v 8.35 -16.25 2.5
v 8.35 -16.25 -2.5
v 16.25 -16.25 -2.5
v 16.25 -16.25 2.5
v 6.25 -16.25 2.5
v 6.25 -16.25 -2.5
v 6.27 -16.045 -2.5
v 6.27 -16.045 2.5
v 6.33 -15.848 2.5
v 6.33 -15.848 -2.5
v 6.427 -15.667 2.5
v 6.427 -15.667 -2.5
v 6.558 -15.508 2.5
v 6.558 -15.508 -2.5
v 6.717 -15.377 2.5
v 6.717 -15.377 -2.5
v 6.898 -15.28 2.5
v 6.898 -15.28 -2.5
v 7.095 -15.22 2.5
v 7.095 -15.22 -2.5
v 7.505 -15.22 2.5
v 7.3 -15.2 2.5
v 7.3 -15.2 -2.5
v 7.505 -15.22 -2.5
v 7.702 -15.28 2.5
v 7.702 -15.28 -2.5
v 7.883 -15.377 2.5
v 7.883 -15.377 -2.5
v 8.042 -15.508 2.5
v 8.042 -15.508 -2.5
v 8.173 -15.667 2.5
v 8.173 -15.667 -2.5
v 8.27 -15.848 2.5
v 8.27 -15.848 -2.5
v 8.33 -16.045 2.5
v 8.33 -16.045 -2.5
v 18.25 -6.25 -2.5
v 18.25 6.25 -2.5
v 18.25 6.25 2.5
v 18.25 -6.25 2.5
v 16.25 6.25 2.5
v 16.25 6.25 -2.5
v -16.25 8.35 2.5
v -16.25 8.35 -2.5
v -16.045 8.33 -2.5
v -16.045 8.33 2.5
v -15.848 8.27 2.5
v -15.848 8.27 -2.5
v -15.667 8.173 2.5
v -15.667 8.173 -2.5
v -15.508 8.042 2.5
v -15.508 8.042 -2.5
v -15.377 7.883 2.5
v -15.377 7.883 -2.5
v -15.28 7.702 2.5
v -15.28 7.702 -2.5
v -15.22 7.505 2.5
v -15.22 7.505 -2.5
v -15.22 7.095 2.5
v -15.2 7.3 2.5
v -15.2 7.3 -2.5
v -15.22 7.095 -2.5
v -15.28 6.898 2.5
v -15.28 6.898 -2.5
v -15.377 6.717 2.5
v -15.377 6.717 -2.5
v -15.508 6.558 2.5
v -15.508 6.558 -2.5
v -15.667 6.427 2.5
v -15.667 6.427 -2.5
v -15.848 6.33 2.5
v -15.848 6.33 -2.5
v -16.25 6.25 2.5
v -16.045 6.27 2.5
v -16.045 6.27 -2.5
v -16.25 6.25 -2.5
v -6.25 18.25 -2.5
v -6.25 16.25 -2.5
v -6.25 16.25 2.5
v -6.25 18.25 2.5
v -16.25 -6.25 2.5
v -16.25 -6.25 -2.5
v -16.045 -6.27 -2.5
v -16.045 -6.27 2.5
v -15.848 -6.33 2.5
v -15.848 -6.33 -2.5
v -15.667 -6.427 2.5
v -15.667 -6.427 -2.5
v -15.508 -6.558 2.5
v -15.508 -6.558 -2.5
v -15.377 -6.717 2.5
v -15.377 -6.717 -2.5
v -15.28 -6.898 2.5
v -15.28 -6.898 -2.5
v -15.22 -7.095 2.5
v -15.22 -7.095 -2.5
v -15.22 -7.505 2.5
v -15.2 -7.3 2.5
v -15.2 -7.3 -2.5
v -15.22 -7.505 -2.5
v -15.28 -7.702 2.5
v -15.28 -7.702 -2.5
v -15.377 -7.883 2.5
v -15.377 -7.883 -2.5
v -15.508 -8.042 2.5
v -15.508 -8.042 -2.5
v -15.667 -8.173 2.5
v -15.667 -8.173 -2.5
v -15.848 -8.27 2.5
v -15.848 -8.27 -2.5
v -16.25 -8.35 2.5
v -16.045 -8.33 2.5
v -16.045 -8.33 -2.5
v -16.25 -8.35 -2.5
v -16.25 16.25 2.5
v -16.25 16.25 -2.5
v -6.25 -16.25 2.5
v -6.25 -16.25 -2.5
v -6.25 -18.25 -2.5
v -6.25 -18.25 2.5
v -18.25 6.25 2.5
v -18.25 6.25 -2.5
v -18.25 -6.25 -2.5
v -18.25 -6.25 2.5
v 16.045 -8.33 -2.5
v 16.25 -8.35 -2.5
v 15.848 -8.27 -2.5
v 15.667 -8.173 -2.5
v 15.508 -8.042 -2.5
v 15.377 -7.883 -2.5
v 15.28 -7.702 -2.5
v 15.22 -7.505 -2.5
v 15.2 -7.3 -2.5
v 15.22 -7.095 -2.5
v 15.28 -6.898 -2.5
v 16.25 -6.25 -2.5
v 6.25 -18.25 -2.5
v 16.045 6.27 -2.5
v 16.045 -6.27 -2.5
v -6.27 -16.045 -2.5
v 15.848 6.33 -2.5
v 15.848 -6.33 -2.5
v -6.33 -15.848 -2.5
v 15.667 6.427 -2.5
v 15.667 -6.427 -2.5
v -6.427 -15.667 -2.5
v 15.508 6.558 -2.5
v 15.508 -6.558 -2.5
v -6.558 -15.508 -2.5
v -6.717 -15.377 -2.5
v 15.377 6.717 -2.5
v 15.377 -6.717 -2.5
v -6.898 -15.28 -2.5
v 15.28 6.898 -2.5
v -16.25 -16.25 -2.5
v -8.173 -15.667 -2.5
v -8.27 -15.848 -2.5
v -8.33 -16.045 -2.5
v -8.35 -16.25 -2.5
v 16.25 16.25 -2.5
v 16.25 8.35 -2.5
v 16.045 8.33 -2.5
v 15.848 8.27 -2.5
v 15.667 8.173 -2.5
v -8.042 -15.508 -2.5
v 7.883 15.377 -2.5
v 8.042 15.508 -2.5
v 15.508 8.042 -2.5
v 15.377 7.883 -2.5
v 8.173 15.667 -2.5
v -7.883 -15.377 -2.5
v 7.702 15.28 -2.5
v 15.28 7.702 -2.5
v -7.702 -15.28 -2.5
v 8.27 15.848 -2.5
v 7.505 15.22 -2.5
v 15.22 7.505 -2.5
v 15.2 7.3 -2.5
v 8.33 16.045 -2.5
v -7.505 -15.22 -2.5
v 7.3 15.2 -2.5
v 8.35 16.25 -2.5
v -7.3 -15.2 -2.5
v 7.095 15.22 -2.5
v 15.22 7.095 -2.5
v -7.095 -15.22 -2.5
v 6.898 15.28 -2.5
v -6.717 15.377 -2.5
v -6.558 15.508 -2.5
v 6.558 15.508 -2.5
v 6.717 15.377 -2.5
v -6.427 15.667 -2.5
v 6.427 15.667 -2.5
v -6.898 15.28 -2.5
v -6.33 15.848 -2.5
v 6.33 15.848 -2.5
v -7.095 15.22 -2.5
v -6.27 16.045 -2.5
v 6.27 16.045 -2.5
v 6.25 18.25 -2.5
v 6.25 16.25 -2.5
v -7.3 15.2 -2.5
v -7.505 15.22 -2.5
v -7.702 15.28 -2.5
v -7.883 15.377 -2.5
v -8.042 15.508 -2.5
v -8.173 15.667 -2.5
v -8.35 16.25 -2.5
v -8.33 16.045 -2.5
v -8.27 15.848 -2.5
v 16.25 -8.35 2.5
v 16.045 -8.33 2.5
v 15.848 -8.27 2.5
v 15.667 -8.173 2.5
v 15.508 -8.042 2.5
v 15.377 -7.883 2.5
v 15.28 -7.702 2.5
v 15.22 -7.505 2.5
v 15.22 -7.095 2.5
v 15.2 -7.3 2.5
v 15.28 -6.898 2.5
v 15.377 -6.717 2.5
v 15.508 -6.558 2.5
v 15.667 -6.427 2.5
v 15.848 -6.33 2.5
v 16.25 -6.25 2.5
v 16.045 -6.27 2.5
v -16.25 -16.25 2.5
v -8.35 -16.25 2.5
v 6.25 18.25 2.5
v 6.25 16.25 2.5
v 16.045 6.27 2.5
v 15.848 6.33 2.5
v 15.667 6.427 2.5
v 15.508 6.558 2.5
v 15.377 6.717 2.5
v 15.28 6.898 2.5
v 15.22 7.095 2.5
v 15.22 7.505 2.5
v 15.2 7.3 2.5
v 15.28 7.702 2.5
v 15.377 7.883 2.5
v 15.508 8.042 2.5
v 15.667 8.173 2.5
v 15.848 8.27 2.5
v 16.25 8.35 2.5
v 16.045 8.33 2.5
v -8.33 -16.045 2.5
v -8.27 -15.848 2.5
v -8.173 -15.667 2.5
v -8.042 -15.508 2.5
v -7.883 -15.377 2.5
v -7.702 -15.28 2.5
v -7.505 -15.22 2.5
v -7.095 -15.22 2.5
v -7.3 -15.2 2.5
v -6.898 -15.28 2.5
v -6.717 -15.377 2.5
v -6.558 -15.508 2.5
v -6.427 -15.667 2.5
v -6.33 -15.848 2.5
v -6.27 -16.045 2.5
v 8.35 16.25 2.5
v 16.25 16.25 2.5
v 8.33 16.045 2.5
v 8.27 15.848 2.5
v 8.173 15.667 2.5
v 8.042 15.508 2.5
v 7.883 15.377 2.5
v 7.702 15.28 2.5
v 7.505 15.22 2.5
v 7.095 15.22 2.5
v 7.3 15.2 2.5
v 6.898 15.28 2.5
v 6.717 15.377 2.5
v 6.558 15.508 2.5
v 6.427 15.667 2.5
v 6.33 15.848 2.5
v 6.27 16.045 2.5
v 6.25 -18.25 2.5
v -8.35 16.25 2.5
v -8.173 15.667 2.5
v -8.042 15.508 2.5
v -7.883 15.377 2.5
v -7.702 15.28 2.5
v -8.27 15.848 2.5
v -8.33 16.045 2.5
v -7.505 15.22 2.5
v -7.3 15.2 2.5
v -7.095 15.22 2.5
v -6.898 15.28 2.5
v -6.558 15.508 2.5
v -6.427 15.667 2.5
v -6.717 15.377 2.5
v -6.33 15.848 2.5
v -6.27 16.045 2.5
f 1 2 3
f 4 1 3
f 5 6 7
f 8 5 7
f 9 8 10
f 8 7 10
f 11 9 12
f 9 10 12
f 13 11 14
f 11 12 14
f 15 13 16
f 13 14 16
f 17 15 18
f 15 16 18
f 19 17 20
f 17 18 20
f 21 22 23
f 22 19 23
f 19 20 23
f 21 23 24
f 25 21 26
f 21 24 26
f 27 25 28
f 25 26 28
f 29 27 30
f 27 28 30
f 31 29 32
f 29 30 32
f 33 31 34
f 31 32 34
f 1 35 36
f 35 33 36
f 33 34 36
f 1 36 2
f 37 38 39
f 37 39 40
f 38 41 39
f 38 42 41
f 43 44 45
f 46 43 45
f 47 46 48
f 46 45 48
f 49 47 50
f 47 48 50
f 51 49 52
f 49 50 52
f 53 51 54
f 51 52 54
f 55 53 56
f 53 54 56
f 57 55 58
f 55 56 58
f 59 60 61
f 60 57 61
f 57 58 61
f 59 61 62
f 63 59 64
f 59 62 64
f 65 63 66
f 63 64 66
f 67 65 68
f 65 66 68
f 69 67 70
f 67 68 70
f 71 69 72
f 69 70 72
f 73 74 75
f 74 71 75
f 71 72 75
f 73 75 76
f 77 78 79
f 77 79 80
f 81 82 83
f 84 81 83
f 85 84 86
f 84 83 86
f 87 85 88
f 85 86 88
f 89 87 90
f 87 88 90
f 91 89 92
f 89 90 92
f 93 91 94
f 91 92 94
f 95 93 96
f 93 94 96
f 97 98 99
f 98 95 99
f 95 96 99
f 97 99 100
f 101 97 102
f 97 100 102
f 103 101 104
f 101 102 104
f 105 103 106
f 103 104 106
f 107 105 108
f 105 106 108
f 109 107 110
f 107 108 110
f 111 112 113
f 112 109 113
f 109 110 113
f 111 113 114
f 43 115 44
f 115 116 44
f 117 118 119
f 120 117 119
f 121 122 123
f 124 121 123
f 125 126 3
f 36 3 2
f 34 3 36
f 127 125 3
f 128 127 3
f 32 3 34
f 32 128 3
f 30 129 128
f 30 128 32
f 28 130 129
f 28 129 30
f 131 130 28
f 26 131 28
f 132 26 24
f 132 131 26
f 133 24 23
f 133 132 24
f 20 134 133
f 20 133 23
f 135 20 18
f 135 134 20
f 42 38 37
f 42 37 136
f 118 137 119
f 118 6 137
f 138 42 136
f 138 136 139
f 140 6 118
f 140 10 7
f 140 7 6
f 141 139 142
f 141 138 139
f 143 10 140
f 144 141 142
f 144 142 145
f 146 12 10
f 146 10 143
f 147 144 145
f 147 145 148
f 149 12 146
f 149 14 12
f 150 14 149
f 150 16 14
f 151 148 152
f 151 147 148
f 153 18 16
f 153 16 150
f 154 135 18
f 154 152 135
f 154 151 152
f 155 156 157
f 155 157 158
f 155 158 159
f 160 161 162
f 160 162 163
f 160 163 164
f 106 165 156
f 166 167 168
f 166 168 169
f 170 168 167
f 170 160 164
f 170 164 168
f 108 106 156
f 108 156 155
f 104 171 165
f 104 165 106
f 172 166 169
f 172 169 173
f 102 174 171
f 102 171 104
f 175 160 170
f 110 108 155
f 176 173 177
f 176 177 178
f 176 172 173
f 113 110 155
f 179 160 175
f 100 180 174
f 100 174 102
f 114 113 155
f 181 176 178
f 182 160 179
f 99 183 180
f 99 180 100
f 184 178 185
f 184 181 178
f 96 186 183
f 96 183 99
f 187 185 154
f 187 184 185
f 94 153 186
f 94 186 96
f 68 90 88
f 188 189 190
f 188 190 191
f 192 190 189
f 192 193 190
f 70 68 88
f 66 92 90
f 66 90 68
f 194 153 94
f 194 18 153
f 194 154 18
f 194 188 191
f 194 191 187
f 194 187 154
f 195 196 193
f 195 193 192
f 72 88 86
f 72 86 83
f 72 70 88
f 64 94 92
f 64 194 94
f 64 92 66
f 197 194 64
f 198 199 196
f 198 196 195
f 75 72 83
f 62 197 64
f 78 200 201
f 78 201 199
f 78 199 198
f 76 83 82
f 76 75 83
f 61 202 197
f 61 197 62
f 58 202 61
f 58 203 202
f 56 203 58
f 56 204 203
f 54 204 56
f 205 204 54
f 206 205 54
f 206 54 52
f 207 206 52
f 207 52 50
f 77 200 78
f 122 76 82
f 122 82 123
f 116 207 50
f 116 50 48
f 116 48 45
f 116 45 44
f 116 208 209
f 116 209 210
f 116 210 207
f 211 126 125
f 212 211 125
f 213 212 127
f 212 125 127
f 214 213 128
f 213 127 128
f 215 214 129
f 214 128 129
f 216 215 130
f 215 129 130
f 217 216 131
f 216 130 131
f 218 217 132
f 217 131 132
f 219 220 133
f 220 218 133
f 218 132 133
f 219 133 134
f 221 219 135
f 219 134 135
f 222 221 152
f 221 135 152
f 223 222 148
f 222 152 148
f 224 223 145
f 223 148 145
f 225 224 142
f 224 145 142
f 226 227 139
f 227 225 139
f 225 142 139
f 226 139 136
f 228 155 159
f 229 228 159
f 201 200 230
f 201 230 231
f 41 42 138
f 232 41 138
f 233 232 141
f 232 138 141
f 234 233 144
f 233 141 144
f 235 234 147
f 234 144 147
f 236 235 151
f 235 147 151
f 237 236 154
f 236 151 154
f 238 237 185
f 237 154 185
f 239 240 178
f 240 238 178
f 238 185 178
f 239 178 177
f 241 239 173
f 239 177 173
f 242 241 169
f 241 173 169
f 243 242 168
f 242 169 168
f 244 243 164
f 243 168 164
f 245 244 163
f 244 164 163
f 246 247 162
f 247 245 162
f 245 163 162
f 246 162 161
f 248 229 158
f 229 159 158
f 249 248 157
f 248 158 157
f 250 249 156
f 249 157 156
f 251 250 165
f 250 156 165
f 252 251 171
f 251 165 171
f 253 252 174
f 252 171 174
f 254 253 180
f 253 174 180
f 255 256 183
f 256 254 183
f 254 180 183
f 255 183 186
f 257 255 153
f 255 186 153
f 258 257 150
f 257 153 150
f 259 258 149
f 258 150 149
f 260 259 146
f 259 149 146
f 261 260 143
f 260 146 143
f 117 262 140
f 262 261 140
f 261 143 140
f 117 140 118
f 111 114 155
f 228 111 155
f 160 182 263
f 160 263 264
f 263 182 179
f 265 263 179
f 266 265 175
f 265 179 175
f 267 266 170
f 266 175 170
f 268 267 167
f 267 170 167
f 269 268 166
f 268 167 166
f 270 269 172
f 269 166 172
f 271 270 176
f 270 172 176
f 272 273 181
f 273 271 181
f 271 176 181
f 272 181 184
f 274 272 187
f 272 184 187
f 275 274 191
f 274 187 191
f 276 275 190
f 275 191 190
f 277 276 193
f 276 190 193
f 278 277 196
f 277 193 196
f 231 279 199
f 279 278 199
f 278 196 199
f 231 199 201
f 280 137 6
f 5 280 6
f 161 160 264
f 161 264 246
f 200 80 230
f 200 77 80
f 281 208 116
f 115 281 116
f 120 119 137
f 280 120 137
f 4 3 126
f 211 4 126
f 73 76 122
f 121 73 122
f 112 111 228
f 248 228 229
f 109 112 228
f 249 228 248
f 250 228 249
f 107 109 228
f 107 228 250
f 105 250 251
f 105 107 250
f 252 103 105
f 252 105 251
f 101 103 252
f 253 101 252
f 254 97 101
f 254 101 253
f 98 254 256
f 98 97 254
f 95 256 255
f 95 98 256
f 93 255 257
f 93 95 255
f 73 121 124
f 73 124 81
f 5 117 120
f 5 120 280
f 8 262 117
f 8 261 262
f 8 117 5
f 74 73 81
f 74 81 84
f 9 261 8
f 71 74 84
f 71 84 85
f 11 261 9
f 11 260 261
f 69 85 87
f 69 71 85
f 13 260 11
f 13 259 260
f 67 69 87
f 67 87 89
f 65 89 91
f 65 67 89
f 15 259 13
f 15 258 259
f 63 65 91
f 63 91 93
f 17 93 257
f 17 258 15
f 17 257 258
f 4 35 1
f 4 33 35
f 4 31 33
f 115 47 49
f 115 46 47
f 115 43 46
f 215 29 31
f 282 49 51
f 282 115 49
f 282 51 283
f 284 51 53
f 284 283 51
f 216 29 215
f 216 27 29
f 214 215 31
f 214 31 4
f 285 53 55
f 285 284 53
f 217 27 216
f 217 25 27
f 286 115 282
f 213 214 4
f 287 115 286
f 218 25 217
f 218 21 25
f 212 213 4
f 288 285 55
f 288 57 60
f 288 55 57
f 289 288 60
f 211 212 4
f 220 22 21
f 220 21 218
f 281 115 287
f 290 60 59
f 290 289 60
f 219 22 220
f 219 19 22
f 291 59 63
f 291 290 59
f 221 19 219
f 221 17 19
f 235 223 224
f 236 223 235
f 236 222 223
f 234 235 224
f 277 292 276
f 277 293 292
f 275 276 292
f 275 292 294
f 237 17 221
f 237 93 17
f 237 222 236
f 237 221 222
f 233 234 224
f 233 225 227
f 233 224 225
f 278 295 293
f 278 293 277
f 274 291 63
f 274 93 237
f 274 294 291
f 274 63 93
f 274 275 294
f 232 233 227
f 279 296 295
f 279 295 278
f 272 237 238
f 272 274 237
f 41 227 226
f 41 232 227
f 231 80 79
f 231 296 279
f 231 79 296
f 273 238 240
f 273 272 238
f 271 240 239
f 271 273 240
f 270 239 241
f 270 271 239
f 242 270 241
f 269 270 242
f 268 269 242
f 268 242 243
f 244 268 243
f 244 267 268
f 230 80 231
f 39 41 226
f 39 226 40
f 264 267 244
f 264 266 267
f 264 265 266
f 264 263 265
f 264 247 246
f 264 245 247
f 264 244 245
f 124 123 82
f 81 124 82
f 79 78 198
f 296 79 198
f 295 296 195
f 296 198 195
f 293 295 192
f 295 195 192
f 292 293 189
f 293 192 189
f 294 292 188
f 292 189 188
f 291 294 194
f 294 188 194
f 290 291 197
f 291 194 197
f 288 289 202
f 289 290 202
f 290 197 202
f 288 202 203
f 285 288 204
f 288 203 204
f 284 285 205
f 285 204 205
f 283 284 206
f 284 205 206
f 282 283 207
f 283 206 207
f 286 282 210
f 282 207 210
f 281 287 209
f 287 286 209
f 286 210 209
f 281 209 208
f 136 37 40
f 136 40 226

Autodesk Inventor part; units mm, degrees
ref_plane "YZ Plane" through (0, 0, 0) normal (1, 0, 0) x (0, 1, 0)
ref_plane "XZ Plane" through (0, 0, 0) normal (0, 1, 0) x (-1, 0, 0)
ref_plane "XY Plane" through (0, 0, 0) normal (0, 0, 1) x (1, 0, 0)
sketch "スケッチ1" plane through (0, 0, 0) normal (0, 0, 1) x (1, 0, 0)
  line L0 (-16.25, -16.25) -> (16.25, -16.25) construction
  line L1 (16.25, -16.25) -> (16.25, 16.25) construction
  line L2 (16.25, 16.25) -> (-16.25, 16.25) construction
  line L3 (-16.25, 16.25) -> (-16.25, -16.25) construction
  line L4 (-16.25, -16.25) -> (16.25, 16.25) construction
  line L5 (16.25, -16.25) -> (-16.25, 16.25) construction
  line L6 (-8.35, 16.25) -> (-16.25, 16.25)
  line L7 (-16.25, 16.25) -> (-16.25, 8.35)
  line L8 (8.35, 16.25) -> (16.25, 16.25)
  line L9 (16.25, 16.25) -> (16.25, 8.35)
  line L10 (-16.25, -8.35) -> (-16.25, -16.25)
  line L11 (-16.25, -16.25) -> (-8.35, -16.25)
  line L12 (8.35, -16.25) -> (16.25, -16.25)
  line L13 (16.25, -16.25) -> (16.25, -8.35)
  line L14 (-6.25, 16.25) -> (-6.25, 18.25)
  line L15 (-6.25, 18.25) -> (6.25, 18.25)
  line L16 (6.25, 18.25) -> (6.25, 16.25)
  arc A0 (-8.35, 16.25) -> (-6.25, 16.25) centre (-7.3, 16.25) ccw
  arc A1 (6.25, 16.25) -> (8.35, 16.25) centre (7.3, 16.25) ccw
  line L17 (0, 16.25) -> (0, 0) construction
  line L18 (0, 0) -> (16.25, 0) construction
  line L19 (-16.25, 6.25) -> (-18.25, 6.25)
  line L20 (-18.25, 6.25) -> (-18.25, -6.25)
  line L21 (-18.25, -6.25) -> (-16.25, -6.25)
  arc A2 (-16.25, 6.25) -> (-16.25, 8.35) centre (-16.25, 7.3) ccw
  arc A3 (-16.25, -8.35) -> (-16.25, -6.25) centre (-16.25, -7.3) ccw
  line L22 (-6.25, -16.25) -> (-6.25, -18.25)
  line L23 (-6.25, -18.25) -> (6.25, -18.25)
  line L24 (6.25, -18.25) -> (6.25, -16.25)
  arc A4 (-6.25, -16.25) -> (-8.35, -16.25) centre (-7.3, -16.25) ccw
  arc A5 (8.35, -16.25) -> (6.25, -16.25) centre (7.3, -16.25) ccw
  line L25 (16.25, 6.25) -> (18.25, 6.25)
  line L26 (18.25, 6.25) -> (18.25, -6.25)
  line L27 (18.25, -6.25) -> (16.25, -6.25)
  arc A6 (16.25, 8.35) -> (16.25, 6.25) centre (16.25, 7.3) ccw
  arc A7 (16.25, -6.25) -> (16.25, -8.35) centre (16.25, -7.3) ccw
  line L28 (-12.8, 16.25) -> (-9.7, 16.25) construction
  line L29 (-9.7, 16.25) -> (-9.7, 13.25) construction
  line L30 (-9.7, 13.25) -> (-12.8, 13.25) construction
  line L31 (-12.8, 13.25) -> (-12.8, 16.25) construction
  line L32 (-16.25, 12.8) -> (-13.25, 12.8) construction
  line L33 (-13.25, 12.8) -> (-13.25, 9.7) construction
  line L34 (-13.25, 9.7) -> (-16.25, 9.7) construction
  line L35 (-16.25, 9.7) -> (-16.25, 12.8) construction
  line L36 (-10.1287, 12.25) -> (10.1287, 12.25)
  line L37 (10.1287, 12.25) -> (0, 2.1213)
  line L38 (0, 2.1213) -> (-10.1287, 12.25)
  line L39 (-12.25, 10.1287) -> (-12.25, -10.1287)
  line L40 (-12.25, -10.1287) -> (-2.1213, 0)
  line L41 (-2.1213, 0) -> (-12.25, 10.1287)
  line L42 (-10.1287, -12.25) -> (10.1287, -12.25)
  line L43 (10.1287, -12.25) -> (0, -2.1213)
  line L44 (0, -2.1213) -> (-10.1287, -12.25)
  line L45 (12.25, 10.1287) -> (12.25, -10.1287)
  line L46 (12.25, -10.1287) -> (2.1213, 0)
  line L47 (2.1213, 0) -> (12.25, 10.1287)
  line L48 (-11.25, 16.25) -> (-11.25, 13.25) construction
  line L49 (-13.25, 11.25) -> (-16.25, 11.25) construction
  dimension "d0" = 32.5
  dimension "d1" = 1.05
  dimension "d2" = 2
  dimension "d3" = 10
  dimension "d4" = 3.1
  dimension "d6" = 3
  dimension "d8" = 3
  dimension "d9" = 3
  dimension "d10" = 3
  dimension "d11" = 3
  dimension "d12" = 3
  dimension "d13" = 4
  dimension "d17" = 5
  dimension "d18" = 5
extrude "押し出し1" add sketch "スケッチ1" along normal blind 2.5 contours A0 L14 L15 L16 A1 L8 L9 A6 L25 L26 L27 A7 L13 L12 A5 L24 L23 L22 A4 L11 L10 A3 L21 L20 L19 A2 L7 L6 | L36 L37 L38 | L41 L40 L39 | L44 L43 L42 | L45 L46 L47
mirror "ミラー1" about plane through (0, 0, 0) normal (0, 0, -1) of "押し出し1"
fillet "フィレット1" [suppressed]
equation "\"d8\" = d6"
equation "\"d10\" = d9"
equation "\"d11\" = d10"
equation "\"d12\" = d11"
equation "\"d18\" = d17"
properties part number "上腕_メインフレーム_1_1" material "アセタール樹脂、黒"
